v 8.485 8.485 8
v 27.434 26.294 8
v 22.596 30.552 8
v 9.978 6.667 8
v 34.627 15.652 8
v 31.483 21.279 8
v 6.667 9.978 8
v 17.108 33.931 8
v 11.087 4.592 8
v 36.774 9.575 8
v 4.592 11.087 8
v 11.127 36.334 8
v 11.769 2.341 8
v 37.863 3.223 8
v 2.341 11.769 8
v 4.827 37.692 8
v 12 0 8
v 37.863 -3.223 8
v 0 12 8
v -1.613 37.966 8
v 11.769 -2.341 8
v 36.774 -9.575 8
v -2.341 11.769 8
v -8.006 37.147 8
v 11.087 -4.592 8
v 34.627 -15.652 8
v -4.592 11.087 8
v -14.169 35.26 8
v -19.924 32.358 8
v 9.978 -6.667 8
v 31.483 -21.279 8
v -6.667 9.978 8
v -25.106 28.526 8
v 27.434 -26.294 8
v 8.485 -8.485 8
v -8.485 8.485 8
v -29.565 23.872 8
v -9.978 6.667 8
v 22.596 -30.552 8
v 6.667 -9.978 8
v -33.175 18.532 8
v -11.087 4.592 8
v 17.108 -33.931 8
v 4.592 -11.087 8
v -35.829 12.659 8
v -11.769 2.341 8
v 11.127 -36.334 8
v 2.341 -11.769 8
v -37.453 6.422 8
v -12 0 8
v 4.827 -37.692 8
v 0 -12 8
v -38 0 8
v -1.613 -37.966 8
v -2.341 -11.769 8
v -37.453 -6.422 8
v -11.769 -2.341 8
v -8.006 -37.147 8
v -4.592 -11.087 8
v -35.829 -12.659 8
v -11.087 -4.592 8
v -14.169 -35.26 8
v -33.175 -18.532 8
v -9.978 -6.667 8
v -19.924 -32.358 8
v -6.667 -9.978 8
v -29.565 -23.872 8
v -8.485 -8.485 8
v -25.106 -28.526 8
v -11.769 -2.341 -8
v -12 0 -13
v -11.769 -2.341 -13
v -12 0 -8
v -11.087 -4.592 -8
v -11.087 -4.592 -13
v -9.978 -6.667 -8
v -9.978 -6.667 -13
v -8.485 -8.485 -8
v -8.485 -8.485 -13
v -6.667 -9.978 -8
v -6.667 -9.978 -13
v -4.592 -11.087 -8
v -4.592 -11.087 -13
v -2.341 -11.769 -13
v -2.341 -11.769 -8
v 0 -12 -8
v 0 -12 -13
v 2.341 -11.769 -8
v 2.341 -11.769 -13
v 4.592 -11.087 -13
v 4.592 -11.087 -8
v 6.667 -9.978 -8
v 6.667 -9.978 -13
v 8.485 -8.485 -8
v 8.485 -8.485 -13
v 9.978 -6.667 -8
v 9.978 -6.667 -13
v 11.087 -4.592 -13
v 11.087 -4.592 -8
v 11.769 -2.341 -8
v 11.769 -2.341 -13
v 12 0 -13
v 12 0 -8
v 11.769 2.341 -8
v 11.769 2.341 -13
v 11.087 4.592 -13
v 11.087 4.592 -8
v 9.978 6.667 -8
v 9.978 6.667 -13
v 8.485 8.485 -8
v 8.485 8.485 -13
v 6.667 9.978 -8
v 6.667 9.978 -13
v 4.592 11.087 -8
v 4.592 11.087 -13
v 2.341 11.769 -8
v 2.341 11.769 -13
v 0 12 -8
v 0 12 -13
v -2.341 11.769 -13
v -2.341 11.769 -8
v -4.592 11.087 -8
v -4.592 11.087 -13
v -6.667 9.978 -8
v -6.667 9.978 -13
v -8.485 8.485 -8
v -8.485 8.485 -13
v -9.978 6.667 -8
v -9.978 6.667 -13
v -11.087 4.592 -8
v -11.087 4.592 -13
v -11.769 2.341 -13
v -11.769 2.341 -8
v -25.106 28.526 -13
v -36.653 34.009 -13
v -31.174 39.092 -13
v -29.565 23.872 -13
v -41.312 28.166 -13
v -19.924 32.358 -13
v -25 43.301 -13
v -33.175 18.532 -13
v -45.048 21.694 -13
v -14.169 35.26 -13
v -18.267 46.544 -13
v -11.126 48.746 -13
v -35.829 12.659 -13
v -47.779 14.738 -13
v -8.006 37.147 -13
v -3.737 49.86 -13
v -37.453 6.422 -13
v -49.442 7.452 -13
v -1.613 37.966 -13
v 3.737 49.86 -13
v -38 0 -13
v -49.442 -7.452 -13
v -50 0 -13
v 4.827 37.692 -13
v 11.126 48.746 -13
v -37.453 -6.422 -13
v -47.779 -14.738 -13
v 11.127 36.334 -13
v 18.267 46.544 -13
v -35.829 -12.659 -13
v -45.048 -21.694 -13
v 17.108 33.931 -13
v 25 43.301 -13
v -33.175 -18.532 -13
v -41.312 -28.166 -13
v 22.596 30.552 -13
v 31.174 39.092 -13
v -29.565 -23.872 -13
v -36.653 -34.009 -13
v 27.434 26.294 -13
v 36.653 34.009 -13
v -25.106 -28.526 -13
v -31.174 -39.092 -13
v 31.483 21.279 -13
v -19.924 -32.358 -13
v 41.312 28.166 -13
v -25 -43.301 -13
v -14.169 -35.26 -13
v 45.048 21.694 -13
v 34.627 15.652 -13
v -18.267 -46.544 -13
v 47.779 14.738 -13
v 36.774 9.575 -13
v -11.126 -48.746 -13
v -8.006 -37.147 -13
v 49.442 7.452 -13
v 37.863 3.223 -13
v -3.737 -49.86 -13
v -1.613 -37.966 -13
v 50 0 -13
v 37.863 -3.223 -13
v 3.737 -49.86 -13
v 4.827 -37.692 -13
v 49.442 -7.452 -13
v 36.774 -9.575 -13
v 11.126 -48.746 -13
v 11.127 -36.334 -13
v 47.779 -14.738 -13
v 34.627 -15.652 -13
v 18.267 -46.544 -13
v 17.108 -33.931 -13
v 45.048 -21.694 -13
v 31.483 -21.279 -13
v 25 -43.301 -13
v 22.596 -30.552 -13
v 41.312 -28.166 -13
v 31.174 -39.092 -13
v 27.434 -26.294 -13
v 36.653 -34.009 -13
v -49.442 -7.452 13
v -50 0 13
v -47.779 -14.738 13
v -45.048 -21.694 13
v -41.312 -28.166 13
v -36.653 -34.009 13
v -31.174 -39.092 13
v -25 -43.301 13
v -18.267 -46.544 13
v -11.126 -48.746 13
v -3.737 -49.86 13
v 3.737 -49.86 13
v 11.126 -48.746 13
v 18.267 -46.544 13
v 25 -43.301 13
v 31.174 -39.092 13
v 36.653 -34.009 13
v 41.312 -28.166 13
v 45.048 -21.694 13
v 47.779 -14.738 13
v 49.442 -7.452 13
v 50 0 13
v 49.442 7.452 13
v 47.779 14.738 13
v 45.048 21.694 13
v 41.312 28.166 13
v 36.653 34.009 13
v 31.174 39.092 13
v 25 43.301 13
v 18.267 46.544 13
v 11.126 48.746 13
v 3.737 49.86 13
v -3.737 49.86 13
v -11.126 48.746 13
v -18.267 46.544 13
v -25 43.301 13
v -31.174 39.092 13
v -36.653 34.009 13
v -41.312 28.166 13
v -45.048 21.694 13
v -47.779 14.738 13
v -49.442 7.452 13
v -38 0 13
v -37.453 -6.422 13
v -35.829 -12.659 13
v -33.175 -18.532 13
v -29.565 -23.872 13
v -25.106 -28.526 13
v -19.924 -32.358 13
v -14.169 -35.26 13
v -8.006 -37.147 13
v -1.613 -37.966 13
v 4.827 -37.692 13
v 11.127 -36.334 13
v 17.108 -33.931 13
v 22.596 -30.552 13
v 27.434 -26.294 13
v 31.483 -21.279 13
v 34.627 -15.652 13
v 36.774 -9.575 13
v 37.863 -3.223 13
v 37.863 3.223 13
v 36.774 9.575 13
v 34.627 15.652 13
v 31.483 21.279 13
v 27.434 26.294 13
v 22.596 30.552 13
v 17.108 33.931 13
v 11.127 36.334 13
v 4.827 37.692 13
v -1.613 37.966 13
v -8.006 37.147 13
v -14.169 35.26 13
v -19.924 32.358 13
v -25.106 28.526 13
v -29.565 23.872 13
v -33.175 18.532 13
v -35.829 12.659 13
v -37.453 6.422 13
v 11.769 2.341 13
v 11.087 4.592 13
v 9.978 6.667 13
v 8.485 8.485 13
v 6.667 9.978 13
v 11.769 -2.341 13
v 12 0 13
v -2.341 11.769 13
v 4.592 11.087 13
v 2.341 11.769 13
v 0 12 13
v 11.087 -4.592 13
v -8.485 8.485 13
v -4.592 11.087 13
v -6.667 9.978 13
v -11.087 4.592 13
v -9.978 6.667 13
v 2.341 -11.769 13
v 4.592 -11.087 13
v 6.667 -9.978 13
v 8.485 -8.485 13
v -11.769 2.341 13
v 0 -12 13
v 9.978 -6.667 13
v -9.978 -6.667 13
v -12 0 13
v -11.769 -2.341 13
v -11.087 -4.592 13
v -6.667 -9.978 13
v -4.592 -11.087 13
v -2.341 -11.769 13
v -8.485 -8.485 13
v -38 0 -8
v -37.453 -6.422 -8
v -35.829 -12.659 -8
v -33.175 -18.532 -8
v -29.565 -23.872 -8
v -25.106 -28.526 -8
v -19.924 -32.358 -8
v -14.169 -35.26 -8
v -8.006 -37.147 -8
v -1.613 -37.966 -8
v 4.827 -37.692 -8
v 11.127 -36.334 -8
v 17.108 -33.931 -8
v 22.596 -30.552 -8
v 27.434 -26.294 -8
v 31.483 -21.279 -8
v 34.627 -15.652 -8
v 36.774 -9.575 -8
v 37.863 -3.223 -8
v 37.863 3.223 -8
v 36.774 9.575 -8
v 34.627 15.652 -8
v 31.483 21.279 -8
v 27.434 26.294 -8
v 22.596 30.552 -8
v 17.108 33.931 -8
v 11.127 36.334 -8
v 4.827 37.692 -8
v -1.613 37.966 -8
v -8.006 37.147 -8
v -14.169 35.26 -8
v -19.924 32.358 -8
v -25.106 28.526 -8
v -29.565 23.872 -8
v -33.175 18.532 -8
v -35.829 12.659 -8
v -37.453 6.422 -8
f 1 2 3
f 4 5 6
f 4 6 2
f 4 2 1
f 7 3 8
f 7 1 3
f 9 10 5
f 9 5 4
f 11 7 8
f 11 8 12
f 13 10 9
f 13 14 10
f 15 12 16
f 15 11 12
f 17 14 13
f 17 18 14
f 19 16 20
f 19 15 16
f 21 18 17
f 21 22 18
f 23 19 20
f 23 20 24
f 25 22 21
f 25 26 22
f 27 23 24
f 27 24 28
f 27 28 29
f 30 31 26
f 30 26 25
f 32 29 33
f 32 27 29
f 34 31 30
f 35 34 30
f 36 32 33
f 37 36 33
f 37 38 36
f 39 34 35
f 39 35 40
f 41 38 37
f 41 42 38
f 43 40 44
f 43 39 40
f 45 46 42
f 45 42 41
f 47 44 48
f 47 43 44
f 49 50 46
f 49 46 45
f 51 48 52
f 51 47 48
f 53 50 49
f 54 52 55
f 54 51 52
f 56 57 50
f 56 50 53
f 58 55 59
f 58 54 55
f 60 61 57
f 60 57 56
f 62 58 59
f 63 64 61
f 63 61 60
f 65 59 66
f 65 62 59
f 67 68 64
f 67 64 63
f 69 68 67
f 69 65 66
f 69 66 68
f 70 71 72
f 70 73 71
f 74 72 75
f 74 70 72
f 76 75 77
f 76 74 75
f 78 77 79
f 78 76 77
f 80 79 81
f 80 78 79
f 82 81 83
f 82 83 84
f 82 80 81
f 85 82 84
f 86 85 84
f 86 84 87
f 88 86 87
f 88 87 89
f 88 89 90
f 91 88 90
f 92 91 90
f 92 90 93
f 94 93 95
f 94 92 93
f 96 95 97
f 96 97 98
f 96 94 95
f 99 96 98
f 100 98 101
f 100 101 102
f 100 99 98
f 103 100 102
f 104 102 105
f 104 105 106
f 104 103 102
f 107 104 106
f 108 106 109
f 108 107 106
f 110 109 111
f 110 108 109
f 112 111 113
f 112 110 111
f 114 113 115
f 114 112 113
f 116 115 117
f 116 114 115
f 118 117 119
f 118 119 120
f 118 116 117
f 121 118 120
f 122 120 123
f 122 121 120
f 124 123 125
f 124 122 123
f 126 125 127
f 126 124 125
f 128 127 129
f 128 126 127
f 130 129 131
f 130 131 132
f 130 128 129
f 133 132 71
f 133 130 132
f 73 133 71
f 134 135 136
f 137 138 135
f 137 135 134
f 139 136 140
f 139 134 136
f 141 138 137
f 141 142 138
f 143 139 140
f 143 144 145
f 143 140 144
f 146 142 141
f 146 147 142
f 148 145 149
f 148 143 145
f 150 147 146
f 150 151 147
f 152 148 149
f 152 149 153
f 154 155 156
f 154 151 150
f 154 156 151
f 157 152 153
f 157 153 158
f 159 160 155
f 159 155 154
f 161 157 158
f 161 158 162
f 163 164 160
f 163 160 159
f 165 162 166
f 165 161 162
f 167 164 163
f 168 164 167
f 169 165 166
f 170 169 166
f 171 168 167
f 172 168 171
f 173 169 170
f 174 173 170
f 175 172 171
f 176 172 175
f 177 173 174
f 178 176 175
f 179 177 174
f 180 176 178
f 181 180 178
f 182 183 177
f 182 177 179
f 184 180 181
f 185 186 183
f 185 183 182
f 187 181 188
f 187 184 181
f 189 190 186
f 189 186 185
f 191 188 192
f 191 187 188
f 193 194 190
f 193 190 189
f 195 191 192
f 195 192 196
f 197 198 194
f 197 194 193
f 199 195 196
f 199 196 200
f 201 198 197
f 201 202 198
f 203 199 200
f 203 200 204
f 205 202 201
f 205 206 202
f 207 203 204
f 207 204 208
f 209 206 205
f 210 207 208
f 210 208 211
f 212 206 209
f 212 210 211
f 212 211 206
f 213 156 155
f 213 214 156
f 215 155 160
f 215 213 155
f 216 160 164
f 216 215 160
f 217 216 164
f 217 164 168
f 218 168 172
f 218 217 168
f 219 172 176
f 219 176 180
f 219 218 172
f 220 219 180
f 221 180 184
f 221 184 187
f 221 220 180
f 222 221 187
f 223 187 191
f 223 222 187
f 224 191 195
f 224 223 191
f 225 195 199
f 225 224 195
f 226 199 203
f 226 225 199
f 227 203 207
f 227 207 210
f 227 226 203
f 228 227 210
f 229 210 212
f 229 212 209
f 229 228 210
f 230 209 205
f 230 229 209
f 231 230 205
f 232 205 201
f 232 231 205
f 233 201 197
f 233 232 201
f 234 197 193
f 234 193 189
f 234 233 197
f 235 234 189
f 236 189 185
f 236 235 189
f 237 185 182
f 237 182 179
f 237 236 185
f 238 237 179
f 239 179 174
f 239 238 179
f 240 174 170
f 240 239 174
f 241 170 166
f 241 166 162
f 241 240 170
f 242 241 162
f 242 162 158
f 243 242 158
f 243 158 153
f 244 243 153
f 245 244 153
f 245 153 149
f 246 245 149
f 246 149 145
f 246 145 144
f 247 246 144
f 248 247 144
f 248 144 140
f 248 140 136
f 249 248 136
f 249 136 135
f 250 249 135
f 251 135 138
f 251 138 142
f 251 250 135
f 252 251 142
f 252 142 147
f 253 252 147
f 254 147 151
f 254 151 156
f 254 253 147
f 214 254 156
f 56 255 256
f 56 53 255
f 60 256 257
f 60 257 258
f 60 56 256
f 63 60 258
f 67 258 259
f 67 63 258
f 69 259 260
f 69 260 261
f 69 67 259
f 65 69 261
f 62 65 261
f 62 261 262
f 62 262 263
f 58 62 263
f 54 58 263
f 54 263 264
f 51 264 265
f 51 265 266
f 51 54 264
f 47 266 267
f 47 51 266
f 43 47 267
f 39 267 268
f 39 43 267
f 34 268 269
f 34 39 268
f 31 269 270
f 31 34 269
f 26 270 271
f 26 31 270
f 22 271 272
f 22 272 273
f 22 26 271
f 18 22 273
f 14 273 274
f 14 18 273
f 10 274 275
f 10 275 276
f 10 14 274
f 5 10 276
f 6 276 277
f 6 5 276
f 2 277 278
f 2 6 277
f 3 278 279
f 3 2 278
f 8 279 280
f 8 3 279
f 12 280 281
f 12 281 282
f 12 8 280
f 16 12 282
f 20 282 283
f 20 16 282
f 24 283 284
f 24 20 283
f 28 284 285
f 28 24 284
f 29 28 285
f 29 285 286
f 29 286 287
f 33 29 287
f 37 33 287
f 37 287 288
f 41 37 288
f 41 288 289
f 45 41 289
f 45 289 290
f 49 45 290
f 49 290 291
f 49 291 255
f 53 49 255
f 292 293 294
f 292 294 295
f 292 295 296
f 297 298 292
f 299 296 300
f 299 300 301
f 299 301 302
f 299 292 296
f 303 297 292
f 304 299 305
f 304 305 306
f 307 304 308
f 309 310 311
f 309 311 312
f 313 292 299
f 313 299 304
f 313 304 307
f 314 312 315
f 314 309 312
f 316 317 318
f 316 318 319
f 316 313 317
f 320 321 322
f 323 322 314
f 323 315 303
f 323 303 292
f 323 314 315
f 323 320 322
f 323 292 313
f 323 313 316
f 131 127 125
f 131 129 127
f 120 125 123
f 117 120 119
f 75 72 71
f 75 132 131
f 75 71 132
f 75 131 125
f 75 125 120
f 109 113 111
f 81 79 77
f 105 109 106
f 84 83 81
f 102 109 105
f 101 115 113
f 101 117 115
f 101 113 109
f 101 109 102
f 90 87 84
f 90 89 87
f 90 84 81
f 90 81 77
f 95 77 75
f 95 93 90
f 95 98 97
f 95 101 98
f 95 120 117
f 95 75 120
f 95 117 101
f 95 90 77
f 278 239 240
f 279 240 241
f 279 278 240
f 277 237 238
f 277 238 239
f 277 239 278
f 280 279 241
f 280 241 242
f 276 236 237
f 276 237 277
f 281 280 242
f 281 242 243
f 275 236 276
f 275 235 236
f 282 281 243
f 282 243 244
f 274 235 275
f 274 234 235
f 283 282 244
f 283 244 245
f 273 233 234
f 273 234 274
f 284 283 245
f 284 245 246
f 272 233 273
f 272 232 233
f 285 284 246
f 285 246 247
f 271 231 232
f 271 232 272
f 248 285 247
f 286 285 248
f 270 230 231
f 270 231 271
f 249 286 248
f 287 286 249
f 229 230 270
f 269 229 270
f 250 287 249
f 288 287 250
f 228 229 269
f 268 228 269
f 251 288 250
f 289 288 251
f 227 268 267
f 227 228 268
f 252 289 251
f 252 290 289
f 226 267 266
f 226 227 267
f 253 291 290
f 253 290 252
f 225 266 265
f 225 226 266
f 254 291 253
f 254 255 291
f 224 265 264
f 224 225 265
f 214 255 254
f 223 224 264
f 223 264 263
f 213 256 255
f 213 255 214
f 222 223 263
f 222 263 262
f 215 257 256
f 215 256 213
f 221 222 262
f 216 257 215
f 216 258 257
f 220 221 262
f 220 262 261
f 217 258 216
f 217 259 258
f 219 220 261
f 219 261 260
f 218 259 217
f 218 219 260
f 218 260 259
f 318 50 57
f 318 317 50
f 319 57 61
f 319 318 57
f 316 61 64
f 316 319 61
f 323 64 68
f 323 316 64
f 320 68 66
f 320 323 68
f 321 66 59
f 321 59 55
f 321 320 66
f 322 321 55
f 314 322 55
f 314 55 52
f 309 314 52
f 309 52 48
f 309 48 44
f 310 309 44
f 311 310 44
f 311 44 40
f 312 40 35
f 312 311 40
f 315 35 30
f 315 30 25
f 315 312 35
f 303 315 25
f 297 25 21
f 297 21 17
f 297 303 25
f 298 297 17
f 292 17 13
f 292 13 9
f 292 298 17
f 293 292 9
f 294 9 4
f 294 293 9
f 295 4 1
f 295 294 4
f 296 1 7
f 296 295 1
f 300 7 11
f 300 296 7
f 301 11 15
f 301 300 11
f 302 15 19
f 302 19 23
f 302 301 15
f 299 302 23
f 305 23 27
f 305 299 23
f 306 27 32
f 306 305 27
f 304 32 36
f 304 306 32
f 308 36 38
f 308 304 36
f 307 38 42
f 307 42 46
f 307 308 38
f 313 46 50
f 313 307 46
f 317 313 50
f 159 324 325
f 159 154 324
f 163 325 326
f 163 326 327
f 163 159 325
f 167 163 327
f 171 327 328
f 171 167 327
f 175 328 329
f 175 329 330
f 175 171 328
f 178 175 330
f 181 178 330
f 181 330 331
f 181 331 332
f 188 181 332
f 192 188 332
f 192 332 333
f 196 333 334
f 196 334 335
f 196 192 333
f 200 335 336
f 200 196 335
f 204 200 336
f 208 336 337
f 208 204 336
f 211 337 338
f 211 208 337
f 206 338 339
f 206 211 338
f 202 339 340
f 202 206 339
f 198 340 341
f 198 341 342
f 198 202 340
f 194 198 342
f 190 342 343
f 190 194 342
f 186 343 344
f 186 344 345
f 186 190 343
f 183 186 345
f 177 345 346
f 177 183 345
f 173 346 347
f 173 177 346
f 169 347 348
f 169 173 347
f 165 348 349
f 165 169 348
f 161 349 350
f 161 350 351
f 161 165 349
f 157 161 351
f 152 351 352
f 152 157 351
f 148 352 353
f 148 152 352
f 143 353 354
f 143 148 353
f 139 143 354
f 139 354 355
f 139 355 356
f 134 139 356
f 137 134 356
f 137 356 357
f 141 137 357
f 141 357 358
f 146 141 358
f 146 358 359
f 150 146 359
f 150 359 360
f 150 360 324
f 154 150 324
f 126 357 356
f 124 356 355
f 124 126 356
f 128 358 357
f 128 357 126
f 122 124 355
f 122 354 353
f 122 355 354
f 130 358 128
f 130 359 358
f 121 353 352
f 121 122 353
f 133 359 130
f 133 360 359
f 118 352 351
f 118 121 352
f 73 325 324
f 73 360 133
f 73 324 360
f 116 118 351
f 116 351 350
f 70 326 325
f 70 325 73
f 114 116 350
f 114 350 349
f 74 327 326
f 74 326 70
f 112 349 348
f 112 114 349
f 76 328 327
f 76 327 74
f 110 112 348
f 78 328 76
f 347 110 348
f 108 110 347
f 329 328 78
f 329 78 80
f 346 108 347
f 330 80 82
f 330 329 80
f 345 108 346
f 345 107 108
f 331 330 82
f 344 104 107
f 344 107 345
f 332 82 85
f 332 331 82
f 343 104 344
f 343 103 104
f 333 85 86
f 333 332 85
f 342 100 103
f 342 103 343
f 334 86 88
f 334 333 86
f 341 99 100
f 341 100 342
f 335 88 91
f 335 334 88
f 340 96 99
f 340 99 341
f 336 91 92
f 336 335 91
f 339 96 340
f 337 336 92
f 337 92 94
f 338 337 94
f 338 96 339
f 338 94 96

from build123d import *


with BuildPart() as part:
    # SK_Wheel → Wheel (revolve)
    with BuildSketch(Plane(origin=(0, 0, 0), x_dir=(1, 0, 0), z_dir=(0, 1, 0)), mode=Mode.PRIVATE) as wheel_sk:
        Polygon((0, 13), (12, 13), (12, 8), (38, 8), (38, 13), (50, 13), (50, -13), (38, -13), (38, -8), (12, -8), (12, -13), (0, -13), align=None)
    revolve(wheel_sk.sketch.rotate(Axis((0, 0, -18), (0, 0, 1)), 180), axis=Axis((0, 0, -18), (0, 0, 1)))


solid = part.part
